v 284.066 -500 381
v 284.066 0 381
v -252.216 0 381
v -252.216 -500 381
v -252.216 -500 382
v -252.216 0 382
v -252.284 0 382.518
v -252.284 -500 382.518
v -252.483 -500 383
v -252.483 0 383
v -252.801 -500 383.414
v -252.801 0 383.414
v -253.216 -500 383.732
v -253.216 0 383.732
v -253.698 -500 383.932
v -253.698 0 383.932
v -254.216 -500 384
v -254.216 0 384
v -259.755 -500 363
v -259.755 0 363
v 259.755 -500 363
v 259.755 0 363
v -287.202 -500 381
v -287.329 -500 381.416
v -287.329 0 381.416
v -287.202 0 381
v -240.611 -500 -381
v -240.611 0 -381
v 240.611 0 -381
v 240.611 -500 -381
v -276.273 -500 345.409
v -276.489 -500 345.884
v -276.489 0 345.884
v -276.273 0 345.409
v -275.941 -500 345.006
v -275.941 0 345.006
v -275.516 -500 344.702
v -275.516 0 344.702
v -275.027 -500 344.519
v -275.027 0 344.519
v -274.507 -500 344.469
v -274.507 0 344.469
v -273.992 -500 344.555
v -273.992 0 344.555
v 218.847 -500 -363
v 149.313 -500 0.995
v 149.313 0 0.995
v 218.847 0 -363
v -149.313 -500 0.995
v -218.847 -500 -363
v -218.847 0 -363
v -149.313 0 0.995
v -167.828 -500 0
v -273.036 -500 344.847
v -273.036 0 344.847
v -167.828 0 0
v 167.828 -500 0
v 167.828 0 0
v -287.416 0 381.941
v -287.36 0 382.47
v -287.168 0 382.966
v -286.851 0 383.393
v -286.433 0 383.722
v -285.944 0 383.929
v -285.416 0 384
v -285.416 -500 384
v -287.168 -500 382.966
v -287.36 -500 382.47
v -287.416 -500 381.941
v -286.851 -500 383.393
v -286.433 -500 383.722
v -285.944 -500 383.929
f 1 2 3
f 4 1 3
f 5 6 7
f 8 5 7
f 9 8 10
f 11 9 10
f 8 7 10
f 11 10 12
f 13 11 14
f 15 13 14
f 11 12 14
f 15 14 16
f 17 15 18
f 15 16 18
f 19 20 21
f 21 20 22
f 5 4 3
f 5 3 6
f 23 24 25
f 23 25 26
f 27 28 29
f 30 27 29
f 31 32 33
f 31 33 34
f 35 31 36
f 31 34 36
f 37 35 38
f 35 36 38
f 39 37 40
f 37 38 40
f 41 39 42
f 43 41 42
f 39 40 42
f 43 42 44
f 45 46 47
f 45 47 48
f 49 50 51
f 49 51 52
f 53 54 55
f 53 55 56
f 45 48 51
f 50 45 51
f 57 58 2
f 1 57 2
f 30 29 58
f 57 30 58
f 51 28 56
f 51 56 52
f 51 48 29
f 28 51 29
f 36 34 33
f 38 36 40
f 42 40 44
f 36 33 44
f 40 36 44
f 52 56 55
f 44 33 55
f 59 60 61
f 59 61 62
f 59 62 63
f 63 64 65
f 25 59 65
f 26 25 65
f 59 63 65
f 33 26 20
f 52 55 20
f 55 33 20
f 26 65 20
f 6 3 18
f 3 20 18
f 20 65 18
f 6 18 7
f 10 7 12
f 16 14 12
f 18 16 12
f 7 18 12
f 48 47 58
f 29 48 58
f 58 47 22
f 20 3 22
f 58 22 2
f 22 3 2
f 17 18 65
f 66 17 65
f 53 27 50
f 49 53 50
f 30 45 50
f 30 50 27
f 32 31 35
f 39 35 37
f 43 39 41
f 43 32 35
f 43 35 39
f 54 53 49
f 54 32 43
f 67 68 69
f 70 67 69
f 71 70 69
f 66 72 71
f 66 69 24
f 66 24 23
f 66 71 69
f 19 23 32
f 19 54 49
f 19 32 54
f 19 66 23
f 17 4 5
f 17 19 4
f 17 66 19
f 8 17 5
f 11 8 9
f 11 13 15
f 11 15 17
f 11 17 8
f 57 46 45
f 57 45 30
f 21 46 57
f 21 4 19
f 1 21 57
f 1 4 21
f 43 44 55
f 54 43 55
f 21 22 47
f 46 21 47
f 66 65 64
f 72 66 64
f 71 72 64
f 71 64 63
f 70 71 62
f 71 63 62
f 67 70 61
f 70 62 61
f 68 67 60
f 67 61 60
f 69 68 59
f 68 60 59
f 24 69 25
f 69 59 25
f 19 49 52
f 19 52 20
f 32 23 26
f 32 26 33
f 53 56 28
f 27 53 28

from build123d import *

# Parameters (mm, degrees)
F1_DEPTH = 500


with BuildPart() as f1:
    # F0 (on Front) → F1 (new body)
    with BuildSketch(Plane.XZ):
        Polygon((-252.215505, 381), (-284.065813, 381), (-278.574283, 363), (-273.035955, 344.846608), (-167.828424, 0), (-240.610838, -381), (240.610838, -381), (167.828424, 0), (284.065813, 381), align=None)
        Polygon((-149.312886, 0.994866), (-259.755226, 363), (259.755226, 363), (149.312886, 0.994866), (218.84681, -363), (-218.84681, -363), align=None, mode=Mode.SUBTRACT)
        with BuildLine():
            Line((-287.202322, 381), (-284.065813, 381))
            Line((-284.065813, 381), (-252.215505, 381))
            Line((-252.215505, 381), (-252.215505, 382))
            ThreePointArc((-252.215505, 382), (-252.801291, 383.414214), (-254.215505, 384))
            Line((-254.215505, 384), (-285.416401, 384))
            ThreePointArc((-285.416401, 384), (-287.023763, 383.19012), (-287.329356, 381.416386))
            Line((-287.329356, 381.416386), (-287.202322, 381))
        make_face()
        with BuildLine():
            Line((-278.574283, 363), (-284.065813, 381))
            Line((-284.065813, 381), (-287.202322, 381))
            Line((-287.202322, 381), (-276.489001, 345.884142))
            ThreePointArc((-276.489001, 345.884142), (-275.516032, 344.702416), (-273.992432, 344.554801))
            Line((-273.992432, 344.554801), (-273.035955, 344.846608))
            Line((-273.035955, 344.846608), (-278.574283, 363))
        make_face()
    extrude(amount=F1_DEPTH)


solid = f1.part
